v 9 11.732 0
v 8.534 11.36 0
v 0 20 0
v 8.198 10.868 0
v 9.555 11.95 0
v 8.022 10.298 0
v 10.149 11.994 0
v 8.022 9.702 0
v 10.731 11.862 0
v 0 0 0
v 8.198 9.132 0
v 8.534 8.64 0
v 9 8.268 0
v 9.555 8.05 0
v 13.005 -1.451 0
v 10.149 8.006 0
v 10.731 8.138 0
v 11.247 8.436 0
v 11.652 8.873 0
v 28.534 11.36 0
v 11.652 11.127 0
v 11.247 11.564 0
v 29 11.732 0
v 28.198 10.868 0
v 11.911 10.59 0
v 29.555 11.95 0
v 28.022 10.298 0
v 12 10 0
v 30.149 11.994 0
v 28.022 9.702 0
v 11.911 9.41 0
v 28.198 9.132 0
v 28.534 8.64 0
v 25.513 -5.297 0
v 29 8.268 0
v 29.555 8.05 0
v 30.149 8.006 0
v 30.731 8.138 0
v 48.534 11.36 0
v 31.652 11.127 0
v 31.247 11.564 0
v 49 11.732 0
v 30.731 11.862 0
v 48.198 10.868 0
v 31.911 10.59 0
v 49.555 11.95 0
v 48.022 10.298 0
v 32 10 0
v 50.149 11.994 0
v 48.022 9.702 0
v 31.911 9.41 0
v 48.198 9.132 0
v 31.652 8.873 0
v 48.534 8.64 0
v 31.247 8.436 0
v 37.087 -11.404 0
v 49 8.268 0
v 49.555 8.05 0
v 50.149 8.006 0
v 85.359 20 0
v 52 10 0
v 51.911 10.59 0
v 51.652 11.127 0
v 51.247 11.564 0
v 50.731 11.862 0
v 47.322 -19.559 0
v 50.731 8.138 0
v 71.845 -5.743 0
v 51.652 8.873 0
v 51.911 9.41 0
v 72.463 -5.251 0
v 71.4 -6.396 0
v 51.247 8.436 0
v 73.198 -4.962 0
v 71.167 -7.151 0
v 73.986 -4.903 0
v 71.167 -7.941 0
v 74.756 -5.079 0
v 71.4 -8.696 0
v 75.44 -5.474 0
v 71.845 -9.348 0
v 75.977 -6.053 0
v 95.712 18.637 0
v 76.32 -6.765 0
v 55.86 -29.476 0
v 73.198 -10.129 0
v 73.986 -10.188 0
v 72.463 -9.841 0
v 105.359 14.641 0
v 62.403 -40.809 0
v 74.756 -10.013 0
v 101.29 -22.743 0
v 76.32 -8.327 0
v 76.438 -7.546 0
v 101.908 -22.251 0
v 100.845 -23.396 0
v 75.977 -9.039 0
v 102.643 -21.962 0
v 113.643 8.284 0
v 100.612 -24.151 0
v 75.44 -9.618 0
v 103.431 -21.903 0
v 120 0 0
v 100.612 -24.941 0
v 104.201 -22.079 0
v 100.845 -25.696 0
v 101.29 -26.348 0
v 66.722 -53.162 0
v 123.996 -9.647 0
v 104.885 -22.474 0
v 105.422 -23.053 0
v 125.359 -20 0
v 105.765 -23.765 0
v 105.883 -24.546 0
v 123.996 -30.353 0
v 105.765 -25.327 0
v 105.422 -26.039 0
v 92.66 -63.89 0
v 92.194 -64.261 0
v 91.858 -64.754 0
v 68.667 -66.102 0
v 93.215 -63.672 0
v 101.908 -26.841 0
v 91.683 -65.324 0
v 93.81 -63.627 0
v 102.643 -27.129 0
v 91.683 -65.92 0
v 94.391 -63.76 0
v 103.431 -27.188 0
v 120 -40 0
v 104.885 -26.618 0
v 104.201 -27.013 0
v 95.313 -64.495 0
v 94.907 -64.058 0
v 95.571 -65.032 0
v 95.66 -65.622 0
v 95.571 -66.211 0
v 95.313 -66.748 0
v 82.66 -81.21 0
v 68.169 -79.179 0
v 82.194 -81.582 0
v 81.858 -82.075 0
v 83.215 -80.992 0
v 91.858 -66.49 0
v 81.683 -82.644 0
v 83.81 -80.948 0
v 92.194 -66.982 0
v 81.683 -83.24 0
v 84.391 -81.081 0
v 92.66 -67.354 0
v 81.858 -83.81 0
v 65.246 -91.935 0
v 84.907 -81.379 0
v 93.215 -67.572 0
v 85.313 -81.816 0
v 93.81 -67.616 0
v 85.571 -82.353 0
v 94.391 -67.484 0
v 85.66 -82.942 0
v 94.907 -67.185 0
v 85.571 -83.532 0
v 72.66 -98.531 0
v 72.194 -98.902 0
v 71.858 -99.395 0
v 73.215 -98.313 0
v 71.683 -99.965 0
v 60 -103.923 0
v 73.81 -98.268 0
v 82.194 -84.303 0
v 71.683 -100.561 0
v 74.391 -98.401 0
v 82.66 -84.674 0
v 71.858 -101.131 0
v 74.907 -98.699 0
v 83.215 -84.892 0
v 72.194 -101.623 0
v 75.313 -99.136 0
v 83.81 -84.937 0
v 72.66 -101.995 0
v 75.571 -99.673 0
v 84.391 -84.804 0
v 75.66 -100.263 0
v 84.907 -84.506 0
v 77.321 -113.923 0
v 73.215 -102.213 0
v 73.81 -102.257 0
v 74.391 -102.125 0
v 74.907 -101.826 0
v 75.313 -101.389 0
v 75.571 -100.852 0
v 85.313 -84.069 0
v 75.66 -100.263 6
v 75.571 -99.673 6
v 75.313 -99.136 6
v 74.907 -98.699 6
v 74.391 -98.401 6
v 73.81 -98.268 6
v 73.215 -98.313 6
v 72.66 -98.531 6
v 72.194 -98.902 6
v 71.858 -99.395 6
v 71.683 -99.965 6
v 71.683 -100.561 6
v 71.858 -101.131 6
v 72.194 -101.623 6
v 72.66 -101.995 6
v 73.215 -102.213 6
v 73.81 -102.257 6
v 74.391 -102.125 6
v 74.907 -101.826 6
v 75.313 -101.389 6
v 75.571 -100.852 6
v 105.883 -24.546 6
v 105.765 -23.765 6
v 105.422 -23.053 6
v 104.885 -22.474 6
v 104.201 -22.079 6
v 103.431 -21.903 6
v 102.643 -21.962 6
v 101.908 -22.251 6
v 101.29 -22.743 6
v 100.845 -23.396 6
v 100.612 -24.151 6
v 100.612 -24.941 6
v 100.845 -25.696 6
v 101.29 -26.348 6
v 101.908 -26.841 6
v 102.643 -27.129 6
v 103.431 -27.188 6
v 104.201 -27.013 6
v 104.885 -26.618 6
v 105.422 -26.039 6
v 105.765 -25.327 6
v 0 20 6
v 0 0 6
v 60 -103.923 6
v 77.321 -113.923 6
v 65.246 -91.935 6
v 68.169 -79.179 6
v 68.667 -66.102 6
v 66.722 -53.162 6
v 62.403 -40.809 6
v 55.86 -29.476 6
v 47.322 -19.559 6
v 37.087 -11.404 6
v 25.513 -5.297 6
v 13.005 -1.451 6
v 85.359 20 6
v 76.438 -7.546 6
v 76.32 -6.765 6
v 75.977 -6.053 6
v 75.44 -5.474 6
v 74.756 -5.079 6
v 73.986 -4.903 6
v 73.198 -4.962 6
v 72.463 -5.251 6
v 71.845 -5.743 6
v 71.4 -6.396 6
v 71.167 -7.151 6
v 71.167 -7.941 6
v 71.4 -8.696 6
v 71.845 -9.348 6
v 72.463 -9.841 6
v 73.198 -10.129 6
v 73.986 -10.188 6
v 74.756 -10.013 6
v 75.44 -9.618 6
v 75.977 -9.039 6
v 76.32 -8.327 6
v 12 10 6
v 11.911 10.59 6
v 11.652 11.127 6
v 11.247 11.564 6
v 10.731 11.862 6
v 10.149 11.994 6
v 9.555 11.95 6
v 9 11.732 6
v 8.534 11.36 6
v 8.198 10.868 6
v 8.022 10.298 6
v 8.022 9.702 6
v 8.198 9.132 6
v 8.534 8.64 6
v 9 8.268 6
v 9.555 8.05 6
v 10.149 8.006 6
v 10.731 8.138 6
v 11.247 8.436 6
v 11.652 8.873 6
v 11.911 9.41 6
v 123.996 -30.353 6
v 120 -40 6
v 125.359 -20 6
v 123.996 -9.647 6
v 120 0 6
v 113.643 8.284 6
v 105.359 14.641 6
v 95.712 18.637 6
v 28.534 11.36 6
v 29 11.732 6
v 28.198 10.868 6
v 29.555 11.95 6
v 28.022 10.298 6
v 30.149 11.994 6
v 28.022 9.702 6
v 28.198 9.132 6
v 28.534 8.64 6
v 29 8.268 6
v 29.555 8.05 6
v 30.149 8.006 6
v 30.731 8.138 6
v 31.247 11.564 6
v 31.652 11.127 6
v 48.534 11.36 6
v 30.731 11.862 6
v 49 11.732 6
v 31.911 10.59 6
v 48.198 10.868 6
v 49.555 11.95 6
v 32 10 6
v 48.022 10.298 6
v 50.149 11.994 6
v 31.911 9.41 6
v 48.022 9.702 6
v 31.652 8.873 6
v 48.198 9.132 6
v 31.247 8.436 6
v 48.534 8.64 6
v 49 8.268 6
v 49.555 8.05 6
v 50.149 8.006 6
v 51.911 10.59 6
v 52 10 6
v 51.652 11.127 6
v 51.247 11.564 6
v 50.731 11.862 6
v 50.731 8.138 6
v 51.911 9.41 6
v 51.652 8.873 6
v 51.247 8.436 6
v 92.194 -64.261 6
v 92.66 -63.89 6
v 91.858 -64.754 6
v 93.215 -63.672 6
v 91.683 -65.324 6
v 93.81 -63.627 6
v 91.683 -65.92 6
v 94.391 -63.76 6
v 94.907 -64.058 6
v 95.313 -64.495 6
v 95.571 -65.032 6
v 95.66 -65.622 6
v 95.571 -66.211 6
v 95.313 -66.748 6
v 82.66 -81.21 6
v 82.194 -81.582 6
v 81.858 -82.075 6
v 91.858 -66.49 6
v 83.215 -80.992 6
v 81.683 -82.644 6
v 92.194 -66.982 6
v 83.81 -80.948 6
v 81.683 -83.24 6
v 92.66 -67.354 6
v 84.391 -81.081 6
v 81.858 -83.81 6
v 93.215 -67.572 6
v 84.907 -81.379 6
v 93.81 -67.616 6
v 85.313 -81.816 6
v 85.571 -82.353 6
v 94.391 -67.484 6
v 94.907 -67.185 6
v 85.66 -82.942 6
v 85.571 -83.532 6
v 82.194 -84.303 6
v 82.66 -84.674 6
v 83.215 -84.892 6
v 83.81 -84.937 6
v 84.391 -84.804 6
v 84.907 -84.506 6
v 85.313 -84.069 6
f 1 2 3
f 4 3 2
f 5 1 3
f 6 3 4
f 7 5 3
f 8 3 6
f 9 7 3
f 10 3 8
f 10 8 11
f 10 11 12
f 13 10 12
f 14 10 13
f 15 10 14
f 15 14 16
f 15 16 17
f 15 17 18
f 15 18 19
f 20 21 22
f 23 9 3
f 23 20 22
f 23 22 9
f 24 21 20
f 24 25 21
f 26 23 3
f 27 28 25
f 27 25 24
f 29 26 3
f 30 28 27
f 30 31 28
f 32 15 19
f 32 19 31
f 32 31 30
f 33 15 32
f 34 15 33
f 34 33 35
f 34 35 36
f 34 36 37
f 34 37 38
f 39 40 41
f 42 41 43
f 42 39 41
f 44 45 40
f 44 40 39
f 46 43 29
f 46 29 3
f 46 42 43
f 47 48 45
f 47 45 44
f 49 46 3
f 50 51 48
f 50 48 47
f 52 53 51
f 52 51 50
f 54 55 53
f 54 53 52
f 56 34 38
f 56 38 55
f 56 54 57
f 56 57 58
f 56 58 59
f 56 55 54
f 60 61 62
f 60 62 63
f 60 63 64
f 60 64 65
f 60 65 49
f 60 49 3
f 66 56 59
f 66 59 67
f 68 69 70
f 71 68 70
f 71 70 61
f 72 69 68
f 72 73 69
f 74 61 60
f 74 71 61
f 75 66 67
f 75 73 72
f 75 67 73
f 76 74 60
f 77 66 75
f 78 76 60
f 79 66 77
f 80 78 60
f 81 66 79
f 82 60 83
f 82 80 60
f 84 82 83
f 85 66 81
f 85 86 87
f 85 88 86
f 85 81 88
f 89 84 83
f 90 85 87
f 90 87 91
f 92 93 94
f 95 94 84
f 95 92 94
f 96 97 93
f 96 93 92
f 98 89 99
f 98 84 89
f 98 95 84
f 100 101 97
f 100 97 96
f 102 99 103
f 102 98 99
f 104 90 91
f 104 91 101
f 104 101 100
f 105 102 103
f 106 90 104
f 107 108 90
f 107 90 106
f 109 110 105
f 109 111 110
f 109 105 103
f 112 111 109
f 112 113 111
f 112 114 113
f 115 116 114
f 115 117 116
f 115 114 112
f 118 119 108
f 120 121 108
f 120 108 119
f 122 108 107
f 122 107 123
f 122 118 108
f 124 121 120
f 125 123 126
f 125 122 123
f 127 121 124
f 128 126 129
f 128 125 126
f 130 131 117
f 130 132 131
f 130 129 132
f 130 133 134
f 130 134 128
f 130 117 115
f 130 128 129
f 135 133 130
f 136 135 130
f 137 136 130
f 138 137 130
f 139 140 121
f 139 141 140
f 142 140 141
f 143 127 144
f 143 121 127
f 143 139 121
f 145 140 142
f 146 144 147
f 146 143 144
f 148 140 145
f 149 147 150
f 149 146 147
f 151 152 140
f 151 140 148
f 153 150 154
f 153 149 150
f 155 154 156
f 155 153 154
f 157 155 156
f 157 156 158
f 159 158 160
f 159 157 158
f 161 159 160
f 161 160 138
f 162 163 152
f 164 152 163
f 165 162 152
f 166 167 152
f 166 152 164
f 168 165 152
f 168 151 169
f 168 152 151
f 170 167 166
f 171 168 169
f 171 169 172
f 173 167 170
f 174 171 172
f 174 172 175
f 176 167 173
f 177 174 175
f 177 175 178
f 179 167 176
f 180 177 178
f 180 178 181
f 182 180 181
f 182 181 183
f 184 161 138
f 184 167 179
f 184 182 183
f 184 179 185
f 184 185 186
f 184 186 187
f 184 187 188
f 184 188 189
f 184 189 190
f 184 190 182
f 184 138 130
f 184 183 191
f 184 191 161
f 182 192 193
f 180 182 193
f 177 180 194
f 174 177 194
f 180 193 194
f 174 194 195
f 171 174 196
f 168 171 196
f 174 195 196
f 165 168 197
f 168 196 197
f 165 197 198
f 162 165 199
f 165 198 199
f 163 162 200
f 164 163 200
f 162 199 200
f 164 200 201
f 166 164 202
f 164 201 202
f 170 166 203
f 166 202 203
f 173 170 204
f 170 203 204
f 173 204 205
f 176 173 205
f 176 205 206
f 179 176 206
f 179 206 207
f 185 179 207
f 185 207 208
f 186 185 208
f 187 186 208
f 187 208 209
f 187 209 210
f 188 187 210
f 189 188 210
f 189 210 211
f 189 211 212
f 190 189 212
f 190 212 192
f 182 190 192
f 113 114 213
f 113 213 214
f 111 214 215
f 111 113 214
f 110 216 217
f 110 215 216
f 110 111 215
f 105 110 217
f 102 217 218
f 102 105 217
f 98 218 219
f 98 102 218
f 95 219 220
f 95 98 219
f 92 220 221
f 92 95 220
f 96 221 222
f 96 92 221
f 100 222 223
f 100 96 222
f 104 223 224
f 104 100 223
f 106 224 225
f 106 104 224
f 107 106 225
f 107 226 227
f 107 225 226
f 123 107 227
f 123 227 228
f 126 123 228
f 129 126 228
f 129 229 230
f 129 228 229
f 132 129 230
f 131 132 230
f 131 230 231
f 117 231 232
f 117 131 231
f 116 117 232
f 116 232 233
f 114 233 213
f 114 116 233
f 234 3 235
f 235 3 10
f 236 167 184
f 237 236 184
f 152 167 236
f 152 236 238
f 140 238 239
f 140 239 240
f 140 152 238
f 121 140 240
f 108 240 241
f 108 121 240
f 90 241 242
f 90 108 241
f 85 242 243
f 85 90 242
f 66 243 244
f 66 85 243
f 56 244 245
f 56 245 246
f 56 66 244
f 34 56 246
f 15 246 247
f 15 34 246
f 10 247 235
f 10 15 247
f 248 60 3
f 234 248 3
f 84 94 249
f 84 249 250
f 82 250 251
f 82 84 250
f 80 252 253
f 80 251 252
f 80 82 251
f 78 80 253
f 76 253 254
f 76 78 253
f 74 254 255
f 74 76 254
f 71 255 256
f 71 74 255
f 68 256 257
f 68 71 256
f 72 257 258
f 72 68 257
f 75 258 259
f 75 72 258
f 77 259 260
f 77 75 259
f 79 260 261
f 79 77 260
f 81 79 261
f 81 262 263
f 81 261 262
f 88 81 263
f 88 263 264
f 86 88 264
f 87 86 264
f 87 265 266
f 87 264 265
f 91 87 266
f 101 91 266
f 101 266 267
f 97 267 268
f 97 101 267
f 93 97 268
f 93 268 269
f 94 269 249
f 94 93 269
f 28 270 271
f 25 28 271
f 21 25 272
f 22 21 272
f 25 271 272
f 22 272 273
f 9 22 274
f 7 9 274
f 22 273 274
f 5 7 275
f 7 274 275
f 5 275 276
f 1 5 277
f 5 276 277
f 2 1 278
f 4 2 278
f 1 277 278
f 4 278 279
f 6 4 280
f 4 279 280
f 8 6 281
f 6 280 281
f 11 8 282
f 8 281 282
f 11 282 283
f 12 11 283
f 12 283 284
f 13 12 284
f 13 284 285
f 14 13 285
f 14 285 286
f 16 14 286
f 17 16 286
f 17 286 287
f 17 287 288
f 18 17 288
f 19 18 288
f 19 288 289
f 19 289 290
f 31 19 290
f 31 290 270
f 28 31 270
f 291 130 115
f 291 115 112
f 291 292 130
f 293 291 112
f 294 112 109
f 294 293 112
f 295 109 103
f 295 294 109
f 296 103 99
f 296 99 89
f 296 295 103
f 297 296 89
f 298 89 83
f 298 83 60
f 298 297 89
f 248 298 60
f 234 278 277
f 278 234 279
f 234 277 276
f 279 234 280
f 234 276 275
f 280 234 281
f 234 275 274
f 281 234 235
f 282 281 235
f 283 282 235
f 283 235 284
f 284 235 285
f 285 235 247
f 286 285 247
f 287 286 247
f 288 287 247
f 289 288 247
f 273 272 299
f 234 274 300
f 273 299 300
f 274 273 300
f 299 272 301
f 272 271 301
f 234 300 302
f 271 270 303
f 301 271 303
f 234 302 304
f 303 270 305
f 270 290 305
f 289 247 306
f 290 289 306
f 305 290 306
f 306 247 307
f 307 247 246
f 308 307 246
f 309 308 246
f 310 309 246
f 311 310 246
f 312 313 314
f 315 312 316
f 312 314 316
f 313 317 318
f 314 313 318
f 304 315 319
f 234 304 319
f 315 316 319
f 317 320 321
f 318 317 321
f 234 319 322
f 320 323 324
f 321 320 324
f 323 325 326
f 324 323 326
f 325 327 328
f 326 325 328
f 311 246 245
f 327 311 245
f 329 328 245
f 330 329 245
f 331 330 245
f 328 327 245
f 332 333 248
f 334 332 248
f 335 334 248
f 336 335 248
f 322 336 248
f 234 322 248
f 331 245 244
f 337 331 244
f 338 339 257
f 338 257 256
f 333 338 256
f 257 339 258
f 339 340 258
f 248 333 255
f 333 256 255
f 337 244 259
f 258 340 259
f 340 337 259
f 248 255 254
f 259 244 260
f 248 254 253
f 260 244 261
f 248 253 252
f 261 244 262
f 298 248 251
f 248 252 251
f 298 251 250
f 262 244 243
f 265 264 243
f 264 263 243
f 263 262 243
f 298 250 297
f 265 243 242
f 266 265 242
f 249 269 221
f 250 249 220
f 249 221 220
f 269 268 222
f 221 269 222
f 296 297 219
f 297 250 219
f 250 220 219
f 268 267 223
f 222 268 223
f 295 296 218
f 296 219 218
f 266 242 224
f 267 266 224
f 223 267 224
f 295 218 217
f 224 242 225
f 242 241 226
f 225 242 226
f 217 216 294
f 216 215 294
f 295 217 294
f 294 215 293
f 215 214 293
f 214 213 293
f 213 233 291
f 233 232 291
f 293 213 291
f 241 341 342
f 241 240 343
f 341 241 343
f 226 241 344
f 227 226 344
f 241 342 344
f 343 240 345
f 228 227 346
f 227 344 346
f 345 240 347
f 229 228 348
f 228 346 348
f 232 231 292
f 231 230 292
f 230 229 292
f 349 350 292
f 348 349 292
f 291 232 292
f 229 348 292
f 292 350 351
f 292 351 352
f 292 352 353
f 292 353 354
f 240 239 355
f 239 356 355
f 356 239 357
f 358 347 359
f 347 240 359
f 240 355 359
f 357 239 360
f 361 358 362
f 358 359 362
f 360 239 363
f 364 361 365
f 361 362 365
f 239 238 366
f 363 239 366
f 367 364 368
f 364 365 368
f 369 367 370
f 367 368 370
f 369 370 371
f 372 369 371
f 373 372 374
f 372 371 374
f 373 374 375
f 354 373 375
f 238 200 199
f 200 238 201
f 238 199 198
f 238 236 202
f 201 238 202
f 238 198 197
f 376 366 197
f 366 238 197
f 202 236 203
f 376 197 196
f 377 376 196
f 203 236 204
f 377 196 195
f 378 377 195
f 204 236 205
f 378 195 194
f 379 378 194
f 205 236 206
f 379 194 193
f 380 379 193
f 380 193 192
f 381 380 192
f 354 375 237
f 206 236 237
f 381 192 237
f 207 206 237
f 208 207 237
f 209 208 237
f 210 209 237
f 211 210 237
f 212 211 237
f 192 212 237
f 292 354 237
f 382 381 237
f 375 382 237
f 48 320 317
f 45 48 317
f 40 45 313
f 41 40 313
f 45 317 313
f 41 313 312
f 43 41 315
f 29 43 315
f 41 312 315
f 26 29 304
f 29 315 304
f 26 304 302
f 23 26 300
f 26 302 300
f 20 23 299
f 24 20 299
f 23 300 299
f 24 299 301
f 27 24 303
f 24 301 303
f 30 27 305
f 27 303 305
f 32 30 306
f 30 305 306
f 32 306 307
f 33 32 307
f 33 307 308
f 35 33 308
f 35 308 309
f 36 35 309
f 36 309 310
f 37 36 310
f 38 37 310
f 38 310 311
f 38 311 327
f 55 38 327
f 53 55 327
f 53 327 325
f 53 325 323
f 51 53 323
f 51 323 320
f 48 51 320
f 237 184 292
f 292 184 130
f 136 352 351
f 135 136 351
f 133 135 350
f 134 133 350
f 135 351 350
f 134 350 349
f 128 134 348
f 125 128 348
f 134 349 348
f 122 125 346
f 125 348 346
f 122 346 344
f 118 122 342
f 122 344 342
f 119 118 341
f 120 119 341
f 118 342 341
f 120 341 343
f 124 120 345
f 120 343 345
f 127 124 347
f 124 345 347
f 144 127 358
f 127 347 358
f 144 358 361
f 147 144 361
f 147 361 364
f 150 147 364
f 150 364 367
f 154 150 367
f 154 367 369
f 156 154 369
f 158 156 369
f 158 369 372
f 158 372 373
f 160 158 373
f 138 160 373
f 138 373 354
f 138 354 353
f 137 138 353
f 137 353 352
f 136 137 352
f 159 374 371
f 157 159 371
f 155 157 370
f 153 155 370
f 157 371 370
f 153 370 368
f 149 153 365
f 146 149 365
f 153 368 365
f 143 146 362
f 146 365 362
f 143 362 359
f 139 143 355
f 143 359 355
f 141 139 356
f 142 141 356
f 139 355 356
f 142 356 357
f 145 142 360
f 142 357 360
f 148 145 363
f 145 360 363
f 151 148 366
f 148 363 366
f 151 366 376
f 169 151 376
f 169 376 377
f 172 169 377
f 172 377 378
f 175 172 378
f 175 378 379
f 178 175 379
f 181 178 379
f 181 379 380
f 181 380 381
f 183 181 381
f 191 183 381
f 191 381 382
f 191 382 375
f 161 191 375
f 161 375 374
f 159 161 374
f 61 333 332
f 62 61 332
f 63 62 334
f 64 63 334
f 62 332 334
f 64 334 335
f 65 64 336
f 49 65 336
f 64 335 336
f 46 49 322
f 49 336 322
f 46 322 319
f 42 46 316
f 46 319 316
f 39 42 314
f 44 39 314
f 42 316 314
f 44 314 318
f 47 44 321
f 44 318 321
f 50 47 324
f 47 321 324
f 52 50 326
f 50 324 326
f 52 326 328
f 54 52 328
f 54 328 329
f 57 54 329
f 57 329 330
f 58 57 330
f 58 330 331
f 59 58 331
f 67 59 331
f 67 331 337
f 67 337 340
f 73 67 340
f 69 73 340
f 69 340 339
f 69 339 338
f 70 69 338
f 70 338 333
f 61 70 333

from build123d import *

# Parameters (mm, degrees)
EXTRUDE_1_DEPTH          = 6
FILLET_1_R               = 70
FILLET_2_R               = 40
CUT_EXTRUDE_1_DEPTH      = 170.497303225
CUT_EXTRUDE_1_DEPTH_BACK = 170.497303225
SKETCH_2_R               = 2.65
SKETCH_3_R               = 2
CUT_EXTRUDE_2_DEPTH      = 10


with BuildPart() as part:
    # 草图1 → 凸台-拉伸1 (new body)
    with BuildSketch(Plane.XY):
        Polygon((0, 0), (120, 0), (60, -103.923048454), (77.320508076, -113.923048454), (154.641016151, 20), (0, 20), align=None)
    extrude(amount=EXTRUDE_1_DEPTH)

    # 圆角1
    # the kernel refuses this fillet: 70 mm, written as the material it adds along each edge
    with BuildSketch(Plane(origin=(120, 0, 0), x_dir=(-1, 0, 0), z_dir=(0, 0, 1))) as fillet_1_piece_1:
        with BuildLine():
            CenterArc((121.224989992, 69.989280604), FILLET_1_R, 151.002719134, 117.994561732)
            Line((60, 103.923048454), (0, 0))
            Line((0, 0), (120, 0))
        make_face()
    extrude(amount=6)

    # 圆角2
    fillet_2_edges = [part.edges().sort_by_distance(p)[0] for p in [
        (154.641016151, 20, 3),
    ]]
    fillet(fillet_2_edges, radius=FILLET_2_R)

    # 草图2 → 切除-拉伸1 (cut, two sides: drawn at the far end of the back side and taken through both)
    with BuildSketch(Plane.XY.offset(6).offset(-CUT_EXTRUDE_1_DEPTH_BACK)):
        with Locations((103.232600298, -24.545834576)):
            Circle(SKETCH_2_R)
        with Locations((73.787736569, -7.545834576)):
            Circle(SKETCH_2_R)
    extrude(amount=CUT_EXTRUDE_1_DEPTH + CUT_EXTRUDE_1_DEPTH_BACK, mode=Mode.SUBTRACT)

    # 草图3 → 切除-拉伸2 (cut)
    with BuildSketch(Plane.XY.offset(6)):
        with Locations((10, 10)):
            Circle(SKETCH_3_R)
        with Locations((30, 10)):
            Circle(SKETCH_3_R)
        with Locations((50, 10)):
            Circle(SKETCH_3_R)
        with Locations((73.660254038, -100.262794416)):
            Circle(SKETCH_3_R)
        with Locations((83.660254038, -82.942286341)):
            Circle(SKETCH_3_R)
        with Locations((93.660254038, -65.621778265)):
            Circle(SKETCH_3_R)
    extrude(amount=-CUT_EXTRUDE_2_DEPTH, mode=Mode.SUBTRACT)


solid = part.part
